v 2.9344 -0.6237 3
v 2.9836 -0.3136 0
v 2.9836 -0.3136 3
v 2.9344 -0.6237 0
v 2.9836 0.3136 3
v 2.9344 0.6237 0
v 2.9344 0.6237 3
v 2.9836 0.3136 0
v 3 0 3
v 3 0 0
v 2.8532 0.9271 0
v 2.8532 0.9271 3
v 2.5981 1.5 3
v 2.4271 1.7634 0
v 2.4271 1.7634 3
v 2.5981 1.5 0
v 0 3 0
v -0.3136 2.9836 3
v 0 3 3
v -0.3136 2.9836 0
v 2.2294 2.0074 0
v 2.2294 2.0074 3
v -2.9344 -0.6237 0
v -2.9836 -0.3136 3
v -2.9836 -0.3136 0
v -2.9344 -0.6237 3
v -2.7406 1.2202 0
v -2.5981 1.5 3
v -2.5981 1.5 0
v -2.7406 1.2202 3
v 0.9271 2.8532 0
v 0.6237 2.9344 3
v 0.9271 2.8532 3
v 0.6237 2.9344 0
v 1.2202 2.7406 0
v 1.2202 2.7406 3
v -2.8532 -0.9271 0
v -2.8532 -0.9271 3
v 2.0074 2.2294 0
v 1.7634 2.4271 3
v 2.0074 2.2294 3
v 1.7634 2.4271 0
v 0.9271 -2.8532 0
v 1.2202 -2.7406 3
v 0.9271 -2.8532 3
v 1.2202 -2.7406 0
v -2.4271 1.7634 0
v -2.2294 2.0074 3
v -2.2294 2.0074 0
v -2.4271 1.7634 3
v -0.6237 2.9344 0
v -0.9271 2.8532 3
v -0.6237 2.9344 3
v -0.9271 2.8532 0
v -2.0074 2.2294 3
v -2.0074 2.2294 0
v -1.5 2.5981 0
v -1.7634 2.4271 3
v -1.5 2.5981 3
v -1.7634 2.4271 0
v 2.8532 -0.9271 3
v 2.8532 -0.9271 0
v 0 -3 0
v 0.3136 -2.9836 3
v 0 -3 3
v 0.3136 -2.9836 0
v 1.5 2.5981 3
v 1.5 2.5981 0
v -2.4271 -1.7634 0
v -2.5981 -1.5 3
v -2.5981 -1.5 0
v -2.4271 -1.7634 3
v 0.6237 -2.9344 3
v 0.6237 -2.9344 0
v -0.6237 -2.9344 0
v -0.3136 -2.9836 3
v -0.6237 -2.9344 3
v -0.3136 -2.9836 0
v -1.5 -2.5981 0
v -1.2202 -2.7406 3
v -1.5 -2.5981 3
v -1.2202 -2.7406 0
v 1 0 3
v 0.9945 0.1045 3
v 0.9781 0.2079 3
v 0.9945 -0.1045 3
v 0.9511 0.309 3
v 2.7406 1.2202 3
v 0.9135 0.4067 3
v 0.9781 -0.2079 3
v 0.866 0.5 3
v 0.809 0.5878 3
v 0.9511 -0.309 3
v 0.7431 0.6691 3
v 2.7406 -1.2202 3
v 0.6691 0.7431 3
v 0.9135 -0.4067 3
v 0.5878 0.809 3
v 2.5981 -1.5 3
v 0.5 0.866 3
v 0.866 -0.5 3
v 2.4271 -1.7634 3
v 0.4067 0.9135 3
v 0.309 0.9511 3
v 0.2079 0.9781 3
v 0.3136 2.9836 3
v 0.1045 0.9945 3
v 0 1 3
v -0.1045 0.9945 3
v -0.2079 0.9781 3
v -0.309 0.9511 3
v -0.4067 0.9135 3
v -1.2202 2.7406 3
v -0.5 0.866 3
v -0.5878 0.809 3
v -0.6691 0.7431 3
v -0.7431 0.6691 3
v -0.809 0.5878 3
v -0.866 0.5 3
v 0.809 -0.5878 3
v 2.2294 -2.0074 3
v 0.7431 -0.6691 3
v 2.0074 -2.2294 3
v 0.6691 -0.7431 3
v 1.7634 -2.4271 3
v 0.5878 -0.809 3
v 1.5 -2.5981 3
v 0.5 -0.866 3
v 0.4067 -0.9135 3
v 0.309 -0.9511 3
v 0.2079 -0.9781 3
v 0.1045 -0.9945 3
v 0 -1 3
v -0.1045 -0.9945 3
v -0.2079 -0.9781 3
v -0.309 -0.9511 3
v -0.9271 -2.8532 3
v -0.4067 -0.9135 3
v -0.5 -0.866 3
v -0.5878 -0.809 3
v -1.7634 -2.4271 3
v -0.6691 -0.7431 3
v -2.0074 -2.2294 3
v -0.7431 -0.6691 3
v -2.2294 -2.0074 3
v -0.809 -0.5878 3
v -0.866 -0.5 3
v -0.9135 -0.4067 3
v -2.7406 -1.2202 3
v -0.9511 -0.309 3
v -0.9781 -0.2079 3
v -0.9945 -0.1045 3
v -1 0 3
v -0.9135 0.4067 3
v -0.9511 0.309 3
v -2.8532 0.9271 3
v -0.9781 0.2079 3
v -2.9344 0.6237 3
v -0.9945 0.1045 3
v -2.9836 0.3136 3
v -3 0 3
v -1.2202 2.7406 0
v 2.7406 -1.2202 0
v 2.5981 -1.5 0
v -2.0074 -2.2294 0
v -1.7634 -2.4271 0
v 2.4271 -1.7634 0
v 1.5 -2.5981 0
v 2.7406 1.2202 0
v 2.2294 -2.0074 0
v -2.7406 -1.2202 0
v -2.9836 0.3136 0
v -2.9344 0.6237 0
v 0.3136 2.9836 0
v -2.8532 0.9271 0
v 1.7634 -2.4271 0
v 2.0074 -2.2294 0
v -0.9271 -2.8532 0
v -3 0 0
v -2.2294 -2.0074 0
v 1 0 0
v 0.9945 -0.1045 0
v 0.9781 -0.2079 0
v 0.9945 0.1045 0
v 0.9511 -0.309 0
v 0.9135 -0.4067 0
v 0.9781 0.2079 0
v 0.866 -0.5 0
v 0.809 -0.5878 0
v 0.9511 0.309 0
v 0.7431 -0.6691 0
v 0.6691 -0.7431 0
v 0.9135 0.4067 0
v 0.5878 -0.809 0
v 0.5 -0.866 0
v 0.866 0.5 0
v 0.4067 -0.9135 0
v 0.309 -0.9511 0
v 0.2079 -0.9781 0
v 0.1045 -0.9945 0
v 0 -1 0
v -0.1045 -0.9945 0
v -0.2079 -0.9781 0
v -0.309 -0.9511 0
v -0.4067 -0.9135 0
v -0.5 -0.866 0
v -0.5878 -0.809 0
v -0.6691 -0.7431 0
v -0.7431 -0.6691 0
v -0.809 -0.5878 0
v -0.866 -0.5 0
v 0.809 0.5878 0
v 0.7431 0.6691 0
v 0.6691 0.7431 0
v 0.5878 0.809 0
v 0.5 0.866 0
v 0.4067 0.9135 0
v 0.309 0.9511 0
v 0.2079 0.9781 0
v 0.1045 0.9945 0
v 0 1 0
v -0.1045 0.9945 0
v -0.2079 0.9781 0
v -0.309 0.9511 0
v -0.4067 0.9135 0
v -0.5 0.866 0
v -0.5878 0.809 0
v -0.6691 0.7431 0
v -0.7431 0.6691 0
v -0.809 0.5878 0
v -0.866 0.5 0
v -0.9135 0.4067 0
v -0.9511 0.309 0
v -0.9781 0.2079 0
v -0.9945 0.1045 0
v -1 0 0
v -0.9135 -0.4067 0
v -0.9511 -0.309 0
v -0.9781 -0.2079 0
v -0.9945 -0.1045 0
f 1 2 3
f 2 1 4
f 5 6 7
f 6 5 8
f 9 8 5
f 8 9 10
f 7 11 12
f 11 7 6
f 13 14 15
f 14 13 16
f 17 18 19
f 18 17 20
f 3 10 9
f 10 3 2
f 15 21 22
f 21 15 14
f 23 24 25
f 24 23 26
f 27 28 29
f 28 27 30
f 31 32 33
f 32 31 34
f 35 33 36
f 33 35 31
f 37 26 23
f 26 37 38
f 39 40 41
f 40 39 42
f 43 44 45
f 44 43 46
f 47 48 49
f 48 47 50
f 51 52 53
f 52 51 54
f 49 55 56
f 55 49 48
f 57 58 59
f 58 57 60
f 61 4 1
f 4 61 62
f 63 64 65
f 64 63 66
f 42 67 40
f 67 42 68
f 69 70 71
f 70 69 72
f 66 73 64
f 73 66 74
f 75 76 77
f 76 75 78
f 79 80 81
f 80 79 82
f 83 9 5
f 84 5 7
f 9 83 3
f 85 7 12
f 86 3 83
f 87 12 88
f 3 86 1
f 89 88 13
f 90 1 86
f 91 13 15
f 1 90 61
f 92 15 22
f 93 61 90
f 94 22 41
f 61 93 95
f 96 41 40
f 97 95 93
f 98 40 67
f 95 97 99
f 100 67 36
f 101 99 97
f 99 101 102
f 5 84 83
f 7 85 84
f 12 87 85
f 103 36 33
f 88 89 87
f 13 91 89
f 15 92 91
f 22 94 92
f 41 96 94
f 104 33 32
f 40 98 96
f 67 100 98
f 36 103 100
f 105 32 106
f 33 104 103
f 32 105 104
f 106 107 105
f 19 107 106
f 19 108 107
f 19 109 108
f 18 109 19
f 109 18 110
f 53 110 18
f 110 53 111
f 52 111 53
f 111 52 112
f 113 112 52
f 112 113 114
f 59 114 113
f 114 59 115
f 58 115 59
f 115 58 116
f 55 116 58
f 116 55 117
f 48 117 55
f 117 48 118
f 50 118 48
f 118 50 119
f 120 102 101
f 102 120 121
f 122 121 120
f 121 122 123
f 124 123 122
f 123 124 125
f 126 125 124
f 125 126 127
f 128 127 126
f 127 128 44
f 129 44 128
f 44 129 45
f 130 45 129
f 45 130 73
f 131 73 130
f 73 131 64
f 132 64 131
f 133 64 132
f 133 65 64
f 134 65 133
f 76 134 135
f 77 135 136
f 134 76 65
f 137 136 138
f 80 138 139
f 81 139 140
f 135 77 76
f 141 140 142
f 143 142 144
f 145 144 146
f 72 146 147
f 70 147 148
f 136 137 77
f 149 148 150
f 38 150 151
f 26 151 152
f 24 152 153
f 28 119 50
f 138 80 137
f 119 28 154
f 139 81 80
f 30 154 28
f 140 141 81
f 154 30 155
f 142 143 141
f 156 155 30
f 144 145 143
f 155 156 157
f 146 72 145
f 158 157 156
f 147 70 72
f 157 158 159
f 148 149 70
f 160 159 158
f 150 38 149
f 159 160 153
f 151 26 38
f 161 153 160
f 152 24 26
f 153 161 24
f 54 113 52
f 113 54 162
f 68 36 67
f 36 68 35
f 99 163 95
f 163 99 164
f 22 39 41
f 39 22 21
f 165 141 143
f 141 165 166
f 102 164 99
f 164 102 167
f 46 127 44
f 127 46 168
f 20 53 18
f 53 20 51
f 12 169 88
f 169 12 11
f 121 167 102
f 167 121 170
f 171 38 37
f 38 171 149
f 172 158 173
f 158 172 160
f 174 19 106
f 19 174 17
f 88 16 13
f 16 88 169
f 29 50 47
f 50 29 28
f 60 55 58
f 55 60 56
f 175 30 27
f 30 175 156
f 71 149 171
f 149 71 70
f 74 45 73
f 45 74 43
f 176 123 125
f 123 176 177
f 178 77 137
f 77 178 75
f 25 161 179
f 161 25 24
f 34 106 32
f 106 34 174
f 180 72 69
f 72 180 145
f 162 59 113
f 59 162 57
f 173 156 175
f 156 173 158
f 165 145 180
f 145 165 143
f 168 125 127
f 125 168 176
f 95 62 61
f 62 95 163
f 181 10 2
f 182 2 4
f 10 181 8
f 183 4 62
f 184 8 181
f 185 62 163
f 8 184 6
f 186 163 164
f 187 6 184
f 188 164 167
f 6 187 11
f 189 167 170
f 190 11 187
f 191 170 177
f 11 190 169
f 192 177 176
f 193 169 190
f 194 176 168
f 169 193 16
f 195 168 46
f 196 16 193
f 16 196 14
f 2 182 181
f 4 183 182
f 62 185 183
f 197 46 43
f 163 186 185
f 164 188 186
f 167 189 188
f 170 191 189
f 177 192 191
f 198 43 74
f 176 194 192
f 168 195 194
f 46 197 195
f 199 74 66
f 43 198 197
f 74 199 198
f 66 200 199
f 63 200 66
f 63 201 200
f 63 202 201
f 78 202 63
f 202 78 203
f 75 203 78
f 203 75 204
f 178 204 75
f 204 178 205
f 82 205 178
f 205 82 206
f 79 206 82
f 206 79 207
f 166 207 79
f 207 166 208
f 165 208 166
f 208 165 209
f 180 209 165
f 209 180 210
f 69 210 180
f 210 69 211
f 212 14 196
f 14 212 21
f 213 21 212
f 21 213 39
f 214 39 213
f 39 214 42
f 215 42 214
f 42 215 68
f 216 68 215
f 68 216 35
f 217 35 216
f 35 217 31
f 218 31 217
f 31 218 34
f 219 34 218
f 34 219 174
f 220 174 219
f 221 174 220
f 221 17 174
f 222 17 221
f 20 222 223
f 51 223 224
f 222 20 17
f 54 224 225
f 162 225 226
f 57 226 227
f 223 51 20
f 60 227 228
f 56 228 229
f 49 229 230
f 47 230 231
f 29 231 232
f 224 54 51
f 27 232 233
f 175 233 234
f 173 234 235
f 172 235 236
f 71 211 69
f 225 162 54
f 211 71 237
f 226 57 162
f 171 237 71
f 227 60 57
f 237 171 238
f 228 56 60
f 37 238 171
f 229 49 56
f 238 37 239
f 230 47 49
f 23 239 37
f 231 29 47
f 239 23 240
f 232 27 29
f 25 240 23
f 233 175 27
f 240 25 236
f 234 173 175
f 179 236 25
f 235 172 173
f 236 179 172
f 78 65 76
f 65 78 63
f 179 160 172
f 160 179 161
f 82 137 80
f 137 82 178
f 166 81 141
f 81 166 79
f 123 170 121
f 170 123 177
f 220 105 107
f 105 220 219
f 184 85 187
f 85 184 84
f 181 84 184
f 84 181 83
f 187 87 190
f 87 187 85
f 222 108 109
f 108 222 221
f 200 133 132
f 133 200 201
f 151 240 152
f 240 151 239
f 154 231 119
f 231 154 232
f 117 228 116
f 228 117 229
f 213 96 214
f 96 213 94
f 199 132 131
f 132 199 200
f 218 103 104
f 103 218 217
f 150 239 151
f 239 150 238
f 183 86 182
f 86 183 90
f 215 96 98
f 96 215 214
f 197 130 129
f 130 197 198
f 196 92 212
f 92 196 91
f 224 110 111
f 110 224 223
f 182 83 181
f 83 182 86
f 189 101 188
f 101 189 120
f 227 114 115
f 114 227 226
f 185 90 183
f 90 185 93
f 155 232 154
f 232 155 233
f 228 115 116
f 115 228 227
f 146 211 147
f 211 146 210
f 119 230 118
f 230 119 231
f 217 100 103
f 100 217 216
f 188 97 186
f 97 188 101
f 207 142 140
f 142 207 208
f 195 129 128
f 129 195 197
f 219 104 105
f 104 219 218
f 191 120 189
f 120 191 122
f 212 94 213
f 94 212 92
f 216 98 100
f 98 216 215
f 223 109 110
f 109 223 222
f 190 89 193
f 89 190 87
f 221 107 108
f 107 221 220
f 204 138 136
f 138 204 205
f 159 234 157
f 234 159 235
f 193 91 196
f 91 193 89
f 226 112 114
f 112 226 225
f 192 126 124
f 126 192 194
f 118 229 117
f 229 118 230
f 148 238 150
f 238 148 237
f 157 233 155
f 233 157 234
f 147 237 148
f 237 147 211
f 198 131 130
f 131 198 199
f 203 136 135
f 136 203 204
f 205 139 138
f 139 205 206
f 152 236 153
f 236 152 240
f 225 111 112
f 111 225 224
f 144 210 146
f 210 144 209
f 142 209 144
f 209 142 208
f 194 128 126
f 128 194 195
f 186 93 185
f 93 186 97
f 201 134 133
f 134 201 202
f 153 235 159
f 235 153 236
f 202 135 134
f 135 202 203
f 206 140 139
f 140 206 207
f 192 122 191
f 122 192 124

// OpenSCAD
inner_radius = 1;
outer_radius = 3;
height = 3;

difference() {
    cylinder($fn = 60, h = height, r1 = outer_radius, r2 = outer_radius, center = false);
    translate([0, 0, -2])
        cylinder($fn = 60, h = (height*2), r1 = inner_radius, r2 = inner_radius, center = false);
}
